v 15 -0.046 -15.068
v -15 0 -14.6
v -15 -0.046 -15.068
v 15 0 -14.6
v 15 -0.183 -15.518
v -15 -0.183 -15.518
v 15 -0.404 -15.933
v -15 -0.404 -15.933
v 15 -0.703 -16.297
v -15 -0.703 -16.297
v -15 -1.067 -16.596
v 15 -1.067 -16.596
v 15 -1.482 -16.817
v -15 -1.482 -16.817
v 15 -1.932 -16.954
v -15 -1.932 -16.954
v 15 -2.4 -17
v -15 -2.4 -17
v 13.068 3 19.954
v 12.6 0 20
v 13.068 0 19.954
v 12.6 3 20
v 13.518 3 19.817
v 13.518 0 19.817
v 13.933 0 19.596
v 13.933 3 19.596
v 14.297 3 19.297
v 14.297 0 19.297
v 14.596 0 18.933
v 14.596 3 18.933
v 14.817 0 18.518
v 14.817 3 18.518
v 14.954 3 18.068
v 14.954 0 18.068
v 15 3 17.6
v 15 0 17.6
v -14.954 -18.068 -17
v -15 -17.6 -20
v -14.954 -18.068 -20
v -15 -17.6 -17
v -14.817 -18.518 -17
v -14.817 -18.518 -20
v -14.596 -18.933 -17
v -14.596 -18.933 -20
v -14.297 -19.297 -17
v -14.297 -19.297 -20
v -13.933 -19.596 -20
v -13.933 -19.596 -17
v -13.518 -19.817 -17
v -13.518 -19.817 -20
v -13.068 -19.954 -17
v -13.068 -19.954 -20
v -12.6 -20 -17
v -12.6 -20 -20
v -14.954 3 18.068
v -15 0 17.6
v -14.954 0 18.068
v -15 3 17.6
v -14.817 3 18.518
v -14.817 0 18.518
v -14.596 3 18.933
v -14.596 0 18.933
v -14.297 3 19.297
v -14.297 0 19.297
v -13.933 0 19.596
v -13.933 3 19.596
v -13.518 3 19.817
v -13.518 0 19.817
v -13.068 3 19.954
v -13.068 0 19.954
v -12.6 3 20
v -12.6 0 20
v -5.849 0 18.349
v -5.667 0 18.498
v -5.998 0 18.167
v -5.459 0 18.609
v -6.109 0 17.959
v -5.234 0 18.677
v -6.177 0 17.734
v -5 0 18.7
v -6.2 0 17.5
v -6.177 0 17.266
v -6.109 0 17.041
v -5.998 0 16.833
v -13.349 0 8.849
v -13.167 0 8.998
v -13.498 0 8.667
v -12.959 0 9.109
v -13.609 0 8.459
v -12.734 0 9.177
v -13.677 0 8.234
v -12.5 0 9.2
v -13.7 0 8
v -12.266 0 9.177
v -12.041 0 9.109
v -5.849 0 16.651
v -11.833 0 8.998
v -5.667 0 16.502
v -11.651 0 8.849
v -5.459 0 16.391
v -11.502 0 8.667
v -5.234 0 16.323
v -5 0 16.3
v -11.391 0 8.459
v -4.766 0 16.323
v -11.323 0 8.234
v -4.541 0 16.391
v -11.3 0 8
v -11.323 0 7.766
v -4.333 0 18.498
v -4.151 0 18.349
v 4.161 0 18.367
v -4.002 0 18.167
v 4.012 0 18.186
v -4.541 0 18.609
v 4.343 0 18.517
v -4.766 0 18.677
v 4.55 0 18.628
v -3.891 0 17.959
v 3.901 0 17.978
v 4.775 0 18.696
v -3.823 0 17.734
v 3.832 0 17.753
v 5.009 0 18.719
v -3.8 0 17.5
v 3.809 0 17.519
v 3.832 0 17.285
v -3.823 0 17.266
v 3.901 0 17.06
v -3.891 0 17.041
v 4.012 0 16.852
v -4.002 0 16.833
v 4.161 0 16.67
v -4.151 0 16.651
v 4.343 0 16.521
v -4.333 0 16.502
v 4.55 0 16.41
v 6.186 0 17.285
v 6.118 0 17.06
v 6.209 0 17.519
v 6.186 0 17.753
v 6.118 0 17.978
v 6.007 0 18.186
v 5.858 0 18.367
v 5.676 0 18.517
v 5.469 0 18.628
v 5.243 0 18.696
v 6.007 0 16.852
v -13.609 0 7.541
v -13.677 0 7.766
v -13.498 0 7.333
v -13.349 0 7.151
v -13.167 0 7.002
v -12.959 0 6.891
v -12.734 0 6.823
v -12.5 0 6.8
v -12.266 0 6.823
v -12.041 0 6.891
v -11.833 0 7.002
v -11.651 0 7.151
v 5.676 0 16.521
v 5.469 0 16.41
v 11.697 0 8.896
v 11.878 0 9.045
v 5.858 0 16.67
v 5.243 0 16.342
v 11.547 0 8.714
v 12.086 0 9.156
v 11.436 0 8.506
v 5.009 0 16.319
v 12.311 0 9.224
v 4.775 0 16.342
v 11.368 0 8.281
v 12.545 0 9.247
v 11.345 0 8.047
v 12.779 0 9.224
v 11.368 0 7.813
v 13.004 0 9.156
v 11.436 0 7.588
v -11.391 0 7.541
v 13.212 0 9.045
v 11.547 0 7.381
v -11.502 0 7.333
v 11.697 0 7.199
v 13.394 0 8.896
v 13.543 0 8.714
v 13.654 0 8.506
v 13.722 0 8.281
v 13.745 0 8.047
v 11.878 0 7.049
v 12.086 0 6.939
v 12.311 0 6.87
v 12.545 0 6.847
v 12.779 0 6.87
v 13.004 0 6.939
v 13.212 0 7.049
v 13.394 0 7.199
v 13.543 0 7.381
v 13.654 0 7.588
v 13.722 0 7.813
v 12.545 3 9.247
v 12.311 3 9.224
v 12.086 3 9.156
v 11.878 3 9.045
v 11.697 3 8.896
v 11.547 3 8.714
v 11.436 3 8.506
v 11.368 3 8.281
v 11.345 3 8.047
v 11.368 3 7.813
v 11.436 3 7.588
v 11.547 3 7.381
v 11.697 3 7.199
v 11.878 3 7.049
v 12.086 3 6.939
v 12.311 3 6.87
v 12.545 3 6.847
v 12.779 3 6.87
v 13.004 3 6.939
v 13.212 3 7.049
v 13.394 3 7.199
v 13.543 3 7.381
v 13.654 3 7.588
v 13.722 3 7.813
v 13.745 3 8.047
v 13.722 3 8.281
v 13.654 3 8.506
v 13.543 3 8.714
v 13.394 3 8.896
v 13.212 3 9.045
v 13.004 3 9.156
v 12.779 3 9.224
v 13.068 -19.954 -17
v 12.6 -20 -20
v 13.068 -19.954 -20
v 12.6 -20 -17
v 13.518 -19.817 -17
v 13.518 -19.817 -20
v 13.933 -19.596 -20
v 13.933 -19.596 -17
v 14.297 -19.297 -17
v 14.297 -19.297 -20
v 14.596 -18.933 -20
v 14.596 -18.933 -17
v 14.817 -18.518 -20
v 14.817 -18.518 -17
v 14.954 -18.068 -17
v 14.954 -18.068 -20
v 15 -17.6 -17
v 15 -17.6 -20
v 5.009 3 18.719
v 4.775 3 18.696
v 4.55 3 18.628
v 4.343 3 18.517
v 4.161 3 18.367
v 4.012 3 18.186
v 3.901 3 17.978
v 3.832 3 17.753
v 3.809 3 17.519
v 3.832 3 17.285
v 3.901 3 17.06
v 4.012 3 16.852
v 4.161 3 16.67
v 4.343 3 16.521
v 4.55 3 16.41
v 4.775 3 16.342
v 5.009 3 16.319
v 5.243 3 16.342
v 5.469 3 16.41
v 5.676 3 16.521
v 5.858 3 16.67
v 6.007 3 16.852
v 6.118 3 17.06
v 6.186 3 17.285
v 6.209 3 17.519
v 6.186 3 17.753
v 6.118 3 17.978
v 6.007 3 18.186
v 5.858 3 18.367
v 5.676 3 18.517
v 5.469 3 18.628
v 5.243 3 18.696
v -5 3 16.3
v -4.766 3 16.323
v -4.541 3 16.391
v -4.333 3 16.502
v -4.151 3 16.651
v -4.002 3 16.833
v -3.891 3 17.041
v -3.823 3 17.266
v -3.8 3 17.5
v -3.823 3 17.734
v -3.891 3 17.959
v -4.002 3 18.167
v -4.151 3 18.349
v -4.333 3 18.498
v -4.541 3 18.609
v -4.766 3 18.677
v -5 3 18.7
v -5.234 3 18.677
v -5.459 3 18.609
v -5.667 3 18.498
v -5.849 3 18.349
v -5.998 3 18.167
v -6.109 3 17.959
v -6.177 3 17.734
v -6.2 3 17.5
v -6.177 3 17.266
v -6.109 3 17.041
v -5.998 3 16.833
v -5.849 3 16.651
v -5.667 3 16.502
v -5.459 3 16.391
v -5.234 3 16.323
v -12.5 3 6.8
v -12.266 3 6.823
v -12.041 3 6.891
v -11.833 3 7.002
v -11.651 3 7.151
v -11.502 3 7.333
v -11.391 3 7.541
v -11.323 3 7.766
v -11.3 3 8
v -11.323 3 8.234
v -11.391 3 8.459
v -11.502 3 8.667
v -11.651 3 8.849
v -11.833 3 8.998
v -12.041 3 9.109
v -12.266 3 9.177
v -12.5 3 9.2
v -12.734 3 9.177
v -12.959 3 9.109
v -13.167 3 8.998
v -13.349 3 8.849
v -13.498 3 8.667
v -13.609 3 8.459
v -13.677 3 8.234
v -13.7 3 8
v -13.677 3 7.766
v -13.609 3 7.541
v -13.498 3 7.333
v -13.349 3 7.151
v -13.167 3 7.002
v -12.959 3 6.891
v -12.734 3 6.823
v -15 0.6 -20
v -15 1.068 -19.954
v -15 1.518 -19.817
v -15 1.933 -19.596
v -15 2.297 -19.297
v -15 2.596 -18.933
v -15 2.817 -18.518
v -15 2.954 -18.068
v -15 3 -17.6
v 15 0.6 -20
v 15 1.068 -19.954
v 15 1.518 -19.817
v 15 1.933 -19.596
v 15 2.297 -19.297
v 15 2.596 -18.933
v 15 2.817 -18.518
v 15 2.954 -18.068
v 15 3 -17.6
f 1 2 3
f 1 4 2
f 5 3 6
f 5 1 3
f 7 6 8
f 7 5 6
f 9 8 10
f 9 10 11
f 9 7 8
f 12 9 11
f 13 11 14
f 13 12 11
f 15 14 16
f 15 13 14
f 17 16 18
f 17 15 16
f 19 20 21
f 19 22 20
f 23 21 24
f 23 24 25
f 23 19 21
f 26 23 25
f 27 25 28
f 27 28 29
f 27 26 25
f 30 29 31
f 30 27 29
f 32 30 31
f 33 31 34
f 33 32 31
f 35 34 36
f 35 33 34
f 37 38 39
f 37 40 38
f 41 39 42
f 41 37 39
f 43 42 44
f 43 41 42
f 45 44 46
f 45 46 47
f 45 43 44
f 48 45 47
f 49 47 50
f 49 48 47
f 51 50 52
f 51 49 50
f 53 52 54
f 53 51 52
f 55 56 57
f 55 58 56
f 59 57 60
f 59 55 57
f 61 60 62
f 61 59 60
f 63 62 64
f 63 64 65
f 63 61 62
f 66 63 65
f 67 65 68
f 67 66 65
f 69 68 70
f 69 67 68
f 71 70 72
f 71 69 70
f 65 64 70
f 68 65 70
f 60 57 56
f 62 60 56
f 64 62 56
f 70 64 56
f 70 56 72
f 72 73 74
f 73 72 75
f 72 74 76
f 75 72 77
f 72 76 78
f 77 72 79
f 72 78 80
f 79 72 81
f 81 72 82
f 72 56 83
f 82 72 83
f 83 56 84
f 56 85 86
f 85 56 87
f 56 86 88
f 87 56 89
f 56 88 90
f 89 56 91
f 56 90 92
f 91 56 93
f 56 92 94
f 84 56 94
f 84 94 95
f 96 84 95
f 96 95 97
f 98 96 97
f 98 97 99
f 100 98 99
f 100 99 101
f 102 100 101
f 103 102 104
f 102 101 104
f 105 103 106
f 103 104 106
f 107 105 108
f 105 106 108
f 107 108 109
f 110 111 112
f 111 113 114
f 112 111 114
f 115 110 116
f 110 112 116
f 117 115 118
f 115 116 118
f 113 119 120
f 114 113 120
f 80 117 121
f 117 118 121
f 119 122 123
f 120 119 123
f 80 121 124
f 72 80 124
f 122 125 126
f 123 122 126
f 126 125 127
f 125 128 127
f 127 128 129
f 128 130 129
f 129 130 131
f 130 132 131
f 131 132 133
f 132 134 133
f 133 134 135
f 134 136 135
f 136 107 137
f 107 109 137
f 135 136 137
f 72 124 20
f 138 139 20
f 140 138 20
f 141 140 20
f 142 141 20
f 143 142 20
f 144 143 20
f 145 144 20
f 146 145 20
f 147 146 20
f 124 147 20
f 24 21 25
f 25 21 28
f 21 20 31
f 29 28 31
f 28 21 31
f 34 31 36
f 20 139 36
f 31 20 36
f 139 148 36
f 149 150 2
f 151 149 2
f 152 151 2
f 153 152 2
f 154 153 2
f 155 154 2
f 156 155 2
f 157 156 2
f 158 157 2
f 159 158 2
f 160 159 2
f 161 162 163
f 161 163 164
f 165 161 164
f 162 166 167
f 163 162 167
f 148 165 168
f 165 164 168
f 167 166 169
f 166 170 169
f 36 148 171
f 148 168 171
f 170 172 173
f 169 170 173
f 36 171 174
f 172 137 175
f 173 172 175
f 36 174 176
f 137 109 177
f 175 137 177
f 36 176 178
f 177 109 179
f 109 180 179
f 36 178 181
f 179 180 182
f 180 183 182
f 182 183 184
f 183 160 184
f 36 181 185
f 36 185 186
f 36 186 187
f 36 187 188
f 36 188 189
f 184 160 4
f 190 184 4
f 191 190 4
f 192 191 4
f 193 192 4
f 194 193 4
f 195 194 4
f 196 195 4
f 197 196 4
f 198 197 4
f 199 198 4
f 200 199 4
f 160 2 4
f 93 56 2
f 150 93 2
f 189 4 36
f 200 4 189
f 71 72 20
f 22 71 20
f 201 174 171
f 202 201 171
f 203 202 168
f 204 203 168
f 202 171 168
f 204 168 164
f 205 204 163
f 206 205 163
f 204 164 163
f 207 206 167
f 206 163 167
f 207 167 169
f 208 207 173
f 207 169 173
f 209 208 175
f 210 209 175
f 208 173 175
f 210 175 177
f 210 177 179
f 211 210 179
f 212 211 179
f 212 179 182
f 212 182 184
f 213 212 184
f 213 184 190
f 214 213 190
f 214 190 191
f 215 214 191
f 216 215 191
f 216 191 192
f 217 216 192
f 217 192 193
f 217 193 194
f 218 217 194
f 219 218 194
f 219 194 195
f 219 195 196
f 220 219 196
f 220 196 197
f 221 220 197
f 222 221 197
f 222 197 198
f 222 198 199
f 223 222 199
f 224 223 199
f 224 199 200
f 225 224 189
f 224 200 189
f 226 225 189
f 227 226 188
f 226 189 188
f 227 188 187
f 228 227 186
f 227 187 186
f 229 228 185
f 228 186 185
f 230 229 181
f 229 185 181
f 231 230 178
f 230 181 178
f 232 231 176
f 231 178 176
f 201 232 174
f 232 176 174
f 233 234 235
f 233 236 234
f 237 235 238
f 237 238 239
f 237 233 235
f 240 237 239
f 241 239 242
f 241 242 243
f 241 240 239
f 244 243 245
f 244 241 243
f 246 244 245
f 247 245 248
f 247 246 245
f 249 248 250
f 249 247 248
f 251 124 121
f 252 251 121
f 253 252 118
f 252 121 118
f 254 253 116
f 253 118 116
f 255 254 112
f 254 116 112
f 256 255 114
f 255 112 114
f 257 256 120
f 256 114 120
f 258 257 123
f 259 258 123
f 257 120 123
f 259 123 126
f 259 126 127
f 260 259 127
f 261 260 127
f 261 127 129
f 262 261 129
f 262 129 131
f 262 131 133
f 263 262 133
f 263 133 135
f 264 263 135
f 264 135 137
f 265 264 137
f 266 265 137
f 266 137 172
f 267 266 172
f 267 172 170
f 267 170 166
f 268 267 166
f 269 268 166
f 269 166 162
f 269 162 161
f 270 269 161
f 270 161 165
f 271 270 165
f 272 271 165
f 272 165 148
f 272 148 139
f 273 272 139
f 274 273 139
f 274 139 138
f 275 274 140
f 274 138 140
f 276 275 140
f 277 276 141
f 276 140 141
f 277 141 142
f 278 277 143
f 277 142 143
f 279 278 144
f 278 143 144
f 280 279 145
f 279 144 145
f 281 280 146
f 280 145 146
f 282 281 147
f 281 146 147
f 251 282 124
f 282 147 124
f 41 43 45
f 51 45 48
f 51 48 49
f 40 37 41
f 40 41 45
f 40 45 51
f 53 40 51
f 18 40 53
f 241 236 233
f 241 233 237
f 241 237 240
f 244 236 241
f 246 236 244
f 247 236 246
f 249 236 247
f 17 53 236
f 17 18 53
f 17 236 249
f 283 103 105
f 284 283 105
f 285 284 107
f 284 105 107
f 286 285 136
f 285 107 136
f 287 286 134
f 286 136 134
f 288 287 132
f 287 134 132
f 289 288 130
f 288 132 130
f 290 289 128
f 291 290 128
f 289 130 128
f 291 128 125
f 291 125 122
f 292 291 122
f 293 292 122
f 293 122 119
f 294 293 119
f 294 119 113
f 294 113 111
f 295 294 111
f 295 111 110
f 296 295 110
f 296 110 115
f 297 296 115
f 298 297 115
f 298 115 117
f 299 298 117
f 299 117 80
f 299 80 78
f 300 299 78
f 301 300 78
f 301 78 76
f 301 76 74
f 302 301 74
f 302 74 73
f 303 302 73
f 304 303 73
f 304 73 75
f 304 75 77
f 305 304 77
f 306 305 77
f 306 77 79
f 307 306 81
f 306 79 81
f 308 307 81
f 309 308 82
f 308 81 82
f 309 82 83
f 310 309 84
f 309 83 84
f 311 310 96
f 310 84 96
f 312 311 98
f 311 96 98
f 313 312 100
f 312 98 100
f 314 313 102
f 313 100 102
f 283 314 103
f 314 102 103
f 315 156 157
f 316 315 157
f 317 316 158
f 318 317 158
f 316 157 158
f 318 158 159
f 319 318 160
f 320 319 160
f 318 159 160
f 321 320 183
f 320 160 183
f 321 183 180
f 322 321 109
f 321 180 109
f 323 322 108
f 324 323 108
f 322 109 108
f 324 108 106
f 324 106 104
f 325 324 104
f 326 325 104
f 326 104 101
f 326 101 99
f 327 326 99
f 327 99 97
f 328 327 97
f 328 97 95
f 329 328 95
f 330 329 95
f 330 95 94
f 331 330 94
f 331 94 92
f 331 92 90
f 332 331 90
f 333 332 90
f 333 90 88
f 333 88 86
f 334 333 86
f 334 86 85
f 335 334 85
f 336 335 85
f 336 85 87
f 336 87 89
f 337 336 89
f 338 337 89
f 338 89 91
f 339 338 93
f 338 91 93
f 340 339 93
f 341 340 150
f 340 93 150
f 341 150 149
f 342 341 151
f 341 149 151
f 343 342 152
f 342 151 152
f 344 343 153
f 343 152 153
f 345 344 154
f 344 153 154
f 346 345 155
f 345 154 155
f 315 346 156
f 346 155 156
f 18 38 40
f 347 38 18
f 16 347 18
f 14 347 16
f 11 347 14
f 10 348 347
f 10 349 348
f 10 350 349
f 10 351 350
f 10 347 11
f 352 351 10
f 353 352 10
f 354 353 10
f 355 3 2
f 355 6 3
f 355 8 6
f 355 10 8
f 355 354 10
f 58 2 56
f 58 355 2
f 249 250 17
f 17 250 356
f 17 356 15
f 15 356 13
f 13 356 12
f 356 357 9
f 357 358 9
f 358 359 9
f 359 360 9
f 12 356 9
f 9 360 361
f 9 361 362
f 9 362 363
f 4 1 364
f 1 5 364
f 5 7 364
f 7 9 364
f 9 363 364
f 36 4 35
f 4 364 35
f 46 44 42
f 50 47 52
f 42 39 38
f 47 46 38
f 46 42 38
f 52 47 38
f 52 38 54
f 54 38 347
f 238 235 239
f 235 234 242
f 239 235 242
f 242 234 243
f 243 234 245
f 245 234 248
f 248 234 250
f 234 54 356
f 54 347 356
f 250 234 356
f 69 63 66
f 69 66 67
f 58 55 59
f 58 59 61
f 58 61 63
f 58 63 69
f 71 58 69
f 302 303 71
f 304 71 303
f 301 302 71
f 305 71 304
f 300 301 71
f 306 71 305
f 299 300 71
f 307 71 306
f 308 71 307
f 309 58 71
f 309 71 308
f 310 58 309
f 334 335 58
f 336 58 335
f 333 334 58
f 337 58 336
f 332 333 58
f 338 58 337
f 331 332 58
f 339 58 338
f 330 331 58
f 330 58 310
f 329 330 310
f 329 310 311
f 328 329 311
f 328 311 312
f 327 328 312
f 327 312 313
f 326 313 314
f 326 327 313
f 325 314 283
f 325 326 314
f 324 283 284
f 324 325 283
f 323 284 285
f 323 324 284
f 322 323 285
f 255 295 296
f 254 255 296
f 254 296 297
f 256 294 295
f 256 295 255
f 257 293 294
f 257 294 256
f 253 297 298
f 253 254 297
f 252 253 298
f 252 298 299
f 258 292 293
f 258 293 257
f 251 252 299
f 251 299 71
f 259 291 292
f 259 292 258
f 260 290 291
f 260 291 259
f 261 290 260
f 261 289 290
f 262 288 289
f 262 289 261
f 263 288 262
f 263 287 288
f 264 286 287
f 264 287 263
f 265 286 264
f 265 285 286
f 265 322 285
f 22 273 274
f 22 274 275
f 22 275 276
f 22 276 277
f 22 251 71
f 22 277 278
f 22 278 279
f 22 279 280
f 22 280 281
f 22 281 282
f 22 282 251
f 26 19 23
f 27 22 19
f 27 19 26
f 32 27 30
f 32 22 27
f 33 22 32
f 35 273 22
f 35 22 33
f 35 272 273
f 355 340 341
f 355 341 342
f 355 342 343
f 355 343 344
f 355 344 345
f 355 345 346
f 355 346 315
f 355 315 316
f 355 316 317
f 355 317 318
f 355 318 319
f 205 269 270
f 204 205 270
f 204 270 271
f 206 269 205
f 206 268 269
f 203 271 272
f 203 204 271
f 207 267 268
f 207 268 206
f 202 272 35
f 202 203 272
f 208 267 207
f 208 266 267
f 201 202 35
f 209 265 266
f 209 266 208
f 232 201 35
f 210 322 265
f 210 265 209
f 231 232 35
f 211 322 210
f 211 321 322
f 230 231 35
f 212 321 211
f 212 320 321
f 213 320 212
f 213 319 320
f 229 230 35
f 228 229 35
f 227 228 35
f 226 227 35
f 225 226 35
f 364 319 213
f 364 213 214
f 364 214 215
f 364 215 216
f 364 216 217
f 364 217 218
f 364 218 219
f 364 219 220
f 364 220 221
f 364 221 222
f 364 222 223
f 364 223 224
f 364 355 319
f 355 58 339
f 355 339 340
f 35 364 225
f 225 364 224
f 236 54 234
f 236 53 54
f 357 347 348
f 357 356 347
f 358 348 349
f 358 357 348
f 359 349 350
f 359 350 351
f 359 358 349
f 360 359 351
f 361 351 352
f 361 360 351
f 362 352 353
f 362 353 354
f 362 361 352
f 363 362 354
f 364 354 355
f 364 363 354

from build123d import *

# Parameters (mm, degrees)
ESBO_O1_W                = 30
ESBO_O1_H                = 40
RESSALTO_EXTRUS_O1_DEPTH = 3
ESBO_O3_R                = 1.2
CORTE_EXTRUS_O2_DEPTH    = 26.179356624
ESBO_O4_W                = 30
ESBO_O4_H                = 3
RESSALTO_EXTRUS_O2_DEPTH = 20
FILETE5_R                = 2.4
FILETE6_R                = 2.4
FILETE7_R                = 2.4
FILETE8_R                = 2.4


with BuildPart() as part:
    # Esboço1 → Ressalto-extrusão1 (new body)
    with BuildSketch(Plane(origin=(0, 0, 0), x_dir=(1, 0, 0), z_dir=(0, 1, 0))):
        Rectangle(ESBO_O1_W, ESBO_O1_H)
    extrude(amount=RESSALTO_EXTRUS_O1_DEPTH)

    # Esboço3 → Corte-extrusão2 (cut, through all)
    with BuildSketch(Plane.XZ):
        with Locations(Location((-5, 17.5, 0), (0, 0, 270))):
            Circle(ESBO_O3_R)
        with Locations(Location((-12.5, 8, 0), (0, 0, 270))):
            Circle(ESBO_O3_R)
        with Locations(Location((12.545132566, 8.047190753, 0), (0, 0, 90))):
            Circle(ESBO_O3_R)
        with Locations(Location((5.009385606, 17.51885997, 0), (0, 0, 90))):
            Circle(ESBO_O3_R)
    extrude(amount=-CORTE_EXTRUS_O2_DEPTH, mode=Mode.SUBTRACT)

    # Esboço4 → Ressalto-extrusão2 (add)
    with BuildSketch(Plane.XZ):
        with Locations((0, -18.5)):
            Rectangle(ESBO_O4_W, ESBO_O4_H)
    extrude(amount=RESSALTO_EXTRUS_O2_DEPTH)

    # Filete5
    filete5_edges = [part.edges().sort_by_distance(p)[0] for p in [
        (0, 0, -17),
    ]]
    fillet(filete5_edges, radius=FILETE5_R)

    # Filete6
    filete6_edges = [part.edges().sort_by_distance(p)[0] for p in [
        (0, 3, -20),
    ]]
    fillet(filete6_edges, radius=FILETE6_R)

    # Filete7
    filete7_edges = [part.edges().sort_by_distance(p)[0] for p in [
        (15, 1.5, 20),
        (-15, 1.5, 20),
    ]]
    fillet(filete7_edges, radius=FILETE7_R)

    # Filete8
    filete8_edges = [part.edges().sort_by_distance(p)[0] for p in [
        (-15, -20, -18.5),
        (15, -20, -18.5),
    ]]
    fillet(filete8_edges, radius=FILETE8_R)


solid = part.part
